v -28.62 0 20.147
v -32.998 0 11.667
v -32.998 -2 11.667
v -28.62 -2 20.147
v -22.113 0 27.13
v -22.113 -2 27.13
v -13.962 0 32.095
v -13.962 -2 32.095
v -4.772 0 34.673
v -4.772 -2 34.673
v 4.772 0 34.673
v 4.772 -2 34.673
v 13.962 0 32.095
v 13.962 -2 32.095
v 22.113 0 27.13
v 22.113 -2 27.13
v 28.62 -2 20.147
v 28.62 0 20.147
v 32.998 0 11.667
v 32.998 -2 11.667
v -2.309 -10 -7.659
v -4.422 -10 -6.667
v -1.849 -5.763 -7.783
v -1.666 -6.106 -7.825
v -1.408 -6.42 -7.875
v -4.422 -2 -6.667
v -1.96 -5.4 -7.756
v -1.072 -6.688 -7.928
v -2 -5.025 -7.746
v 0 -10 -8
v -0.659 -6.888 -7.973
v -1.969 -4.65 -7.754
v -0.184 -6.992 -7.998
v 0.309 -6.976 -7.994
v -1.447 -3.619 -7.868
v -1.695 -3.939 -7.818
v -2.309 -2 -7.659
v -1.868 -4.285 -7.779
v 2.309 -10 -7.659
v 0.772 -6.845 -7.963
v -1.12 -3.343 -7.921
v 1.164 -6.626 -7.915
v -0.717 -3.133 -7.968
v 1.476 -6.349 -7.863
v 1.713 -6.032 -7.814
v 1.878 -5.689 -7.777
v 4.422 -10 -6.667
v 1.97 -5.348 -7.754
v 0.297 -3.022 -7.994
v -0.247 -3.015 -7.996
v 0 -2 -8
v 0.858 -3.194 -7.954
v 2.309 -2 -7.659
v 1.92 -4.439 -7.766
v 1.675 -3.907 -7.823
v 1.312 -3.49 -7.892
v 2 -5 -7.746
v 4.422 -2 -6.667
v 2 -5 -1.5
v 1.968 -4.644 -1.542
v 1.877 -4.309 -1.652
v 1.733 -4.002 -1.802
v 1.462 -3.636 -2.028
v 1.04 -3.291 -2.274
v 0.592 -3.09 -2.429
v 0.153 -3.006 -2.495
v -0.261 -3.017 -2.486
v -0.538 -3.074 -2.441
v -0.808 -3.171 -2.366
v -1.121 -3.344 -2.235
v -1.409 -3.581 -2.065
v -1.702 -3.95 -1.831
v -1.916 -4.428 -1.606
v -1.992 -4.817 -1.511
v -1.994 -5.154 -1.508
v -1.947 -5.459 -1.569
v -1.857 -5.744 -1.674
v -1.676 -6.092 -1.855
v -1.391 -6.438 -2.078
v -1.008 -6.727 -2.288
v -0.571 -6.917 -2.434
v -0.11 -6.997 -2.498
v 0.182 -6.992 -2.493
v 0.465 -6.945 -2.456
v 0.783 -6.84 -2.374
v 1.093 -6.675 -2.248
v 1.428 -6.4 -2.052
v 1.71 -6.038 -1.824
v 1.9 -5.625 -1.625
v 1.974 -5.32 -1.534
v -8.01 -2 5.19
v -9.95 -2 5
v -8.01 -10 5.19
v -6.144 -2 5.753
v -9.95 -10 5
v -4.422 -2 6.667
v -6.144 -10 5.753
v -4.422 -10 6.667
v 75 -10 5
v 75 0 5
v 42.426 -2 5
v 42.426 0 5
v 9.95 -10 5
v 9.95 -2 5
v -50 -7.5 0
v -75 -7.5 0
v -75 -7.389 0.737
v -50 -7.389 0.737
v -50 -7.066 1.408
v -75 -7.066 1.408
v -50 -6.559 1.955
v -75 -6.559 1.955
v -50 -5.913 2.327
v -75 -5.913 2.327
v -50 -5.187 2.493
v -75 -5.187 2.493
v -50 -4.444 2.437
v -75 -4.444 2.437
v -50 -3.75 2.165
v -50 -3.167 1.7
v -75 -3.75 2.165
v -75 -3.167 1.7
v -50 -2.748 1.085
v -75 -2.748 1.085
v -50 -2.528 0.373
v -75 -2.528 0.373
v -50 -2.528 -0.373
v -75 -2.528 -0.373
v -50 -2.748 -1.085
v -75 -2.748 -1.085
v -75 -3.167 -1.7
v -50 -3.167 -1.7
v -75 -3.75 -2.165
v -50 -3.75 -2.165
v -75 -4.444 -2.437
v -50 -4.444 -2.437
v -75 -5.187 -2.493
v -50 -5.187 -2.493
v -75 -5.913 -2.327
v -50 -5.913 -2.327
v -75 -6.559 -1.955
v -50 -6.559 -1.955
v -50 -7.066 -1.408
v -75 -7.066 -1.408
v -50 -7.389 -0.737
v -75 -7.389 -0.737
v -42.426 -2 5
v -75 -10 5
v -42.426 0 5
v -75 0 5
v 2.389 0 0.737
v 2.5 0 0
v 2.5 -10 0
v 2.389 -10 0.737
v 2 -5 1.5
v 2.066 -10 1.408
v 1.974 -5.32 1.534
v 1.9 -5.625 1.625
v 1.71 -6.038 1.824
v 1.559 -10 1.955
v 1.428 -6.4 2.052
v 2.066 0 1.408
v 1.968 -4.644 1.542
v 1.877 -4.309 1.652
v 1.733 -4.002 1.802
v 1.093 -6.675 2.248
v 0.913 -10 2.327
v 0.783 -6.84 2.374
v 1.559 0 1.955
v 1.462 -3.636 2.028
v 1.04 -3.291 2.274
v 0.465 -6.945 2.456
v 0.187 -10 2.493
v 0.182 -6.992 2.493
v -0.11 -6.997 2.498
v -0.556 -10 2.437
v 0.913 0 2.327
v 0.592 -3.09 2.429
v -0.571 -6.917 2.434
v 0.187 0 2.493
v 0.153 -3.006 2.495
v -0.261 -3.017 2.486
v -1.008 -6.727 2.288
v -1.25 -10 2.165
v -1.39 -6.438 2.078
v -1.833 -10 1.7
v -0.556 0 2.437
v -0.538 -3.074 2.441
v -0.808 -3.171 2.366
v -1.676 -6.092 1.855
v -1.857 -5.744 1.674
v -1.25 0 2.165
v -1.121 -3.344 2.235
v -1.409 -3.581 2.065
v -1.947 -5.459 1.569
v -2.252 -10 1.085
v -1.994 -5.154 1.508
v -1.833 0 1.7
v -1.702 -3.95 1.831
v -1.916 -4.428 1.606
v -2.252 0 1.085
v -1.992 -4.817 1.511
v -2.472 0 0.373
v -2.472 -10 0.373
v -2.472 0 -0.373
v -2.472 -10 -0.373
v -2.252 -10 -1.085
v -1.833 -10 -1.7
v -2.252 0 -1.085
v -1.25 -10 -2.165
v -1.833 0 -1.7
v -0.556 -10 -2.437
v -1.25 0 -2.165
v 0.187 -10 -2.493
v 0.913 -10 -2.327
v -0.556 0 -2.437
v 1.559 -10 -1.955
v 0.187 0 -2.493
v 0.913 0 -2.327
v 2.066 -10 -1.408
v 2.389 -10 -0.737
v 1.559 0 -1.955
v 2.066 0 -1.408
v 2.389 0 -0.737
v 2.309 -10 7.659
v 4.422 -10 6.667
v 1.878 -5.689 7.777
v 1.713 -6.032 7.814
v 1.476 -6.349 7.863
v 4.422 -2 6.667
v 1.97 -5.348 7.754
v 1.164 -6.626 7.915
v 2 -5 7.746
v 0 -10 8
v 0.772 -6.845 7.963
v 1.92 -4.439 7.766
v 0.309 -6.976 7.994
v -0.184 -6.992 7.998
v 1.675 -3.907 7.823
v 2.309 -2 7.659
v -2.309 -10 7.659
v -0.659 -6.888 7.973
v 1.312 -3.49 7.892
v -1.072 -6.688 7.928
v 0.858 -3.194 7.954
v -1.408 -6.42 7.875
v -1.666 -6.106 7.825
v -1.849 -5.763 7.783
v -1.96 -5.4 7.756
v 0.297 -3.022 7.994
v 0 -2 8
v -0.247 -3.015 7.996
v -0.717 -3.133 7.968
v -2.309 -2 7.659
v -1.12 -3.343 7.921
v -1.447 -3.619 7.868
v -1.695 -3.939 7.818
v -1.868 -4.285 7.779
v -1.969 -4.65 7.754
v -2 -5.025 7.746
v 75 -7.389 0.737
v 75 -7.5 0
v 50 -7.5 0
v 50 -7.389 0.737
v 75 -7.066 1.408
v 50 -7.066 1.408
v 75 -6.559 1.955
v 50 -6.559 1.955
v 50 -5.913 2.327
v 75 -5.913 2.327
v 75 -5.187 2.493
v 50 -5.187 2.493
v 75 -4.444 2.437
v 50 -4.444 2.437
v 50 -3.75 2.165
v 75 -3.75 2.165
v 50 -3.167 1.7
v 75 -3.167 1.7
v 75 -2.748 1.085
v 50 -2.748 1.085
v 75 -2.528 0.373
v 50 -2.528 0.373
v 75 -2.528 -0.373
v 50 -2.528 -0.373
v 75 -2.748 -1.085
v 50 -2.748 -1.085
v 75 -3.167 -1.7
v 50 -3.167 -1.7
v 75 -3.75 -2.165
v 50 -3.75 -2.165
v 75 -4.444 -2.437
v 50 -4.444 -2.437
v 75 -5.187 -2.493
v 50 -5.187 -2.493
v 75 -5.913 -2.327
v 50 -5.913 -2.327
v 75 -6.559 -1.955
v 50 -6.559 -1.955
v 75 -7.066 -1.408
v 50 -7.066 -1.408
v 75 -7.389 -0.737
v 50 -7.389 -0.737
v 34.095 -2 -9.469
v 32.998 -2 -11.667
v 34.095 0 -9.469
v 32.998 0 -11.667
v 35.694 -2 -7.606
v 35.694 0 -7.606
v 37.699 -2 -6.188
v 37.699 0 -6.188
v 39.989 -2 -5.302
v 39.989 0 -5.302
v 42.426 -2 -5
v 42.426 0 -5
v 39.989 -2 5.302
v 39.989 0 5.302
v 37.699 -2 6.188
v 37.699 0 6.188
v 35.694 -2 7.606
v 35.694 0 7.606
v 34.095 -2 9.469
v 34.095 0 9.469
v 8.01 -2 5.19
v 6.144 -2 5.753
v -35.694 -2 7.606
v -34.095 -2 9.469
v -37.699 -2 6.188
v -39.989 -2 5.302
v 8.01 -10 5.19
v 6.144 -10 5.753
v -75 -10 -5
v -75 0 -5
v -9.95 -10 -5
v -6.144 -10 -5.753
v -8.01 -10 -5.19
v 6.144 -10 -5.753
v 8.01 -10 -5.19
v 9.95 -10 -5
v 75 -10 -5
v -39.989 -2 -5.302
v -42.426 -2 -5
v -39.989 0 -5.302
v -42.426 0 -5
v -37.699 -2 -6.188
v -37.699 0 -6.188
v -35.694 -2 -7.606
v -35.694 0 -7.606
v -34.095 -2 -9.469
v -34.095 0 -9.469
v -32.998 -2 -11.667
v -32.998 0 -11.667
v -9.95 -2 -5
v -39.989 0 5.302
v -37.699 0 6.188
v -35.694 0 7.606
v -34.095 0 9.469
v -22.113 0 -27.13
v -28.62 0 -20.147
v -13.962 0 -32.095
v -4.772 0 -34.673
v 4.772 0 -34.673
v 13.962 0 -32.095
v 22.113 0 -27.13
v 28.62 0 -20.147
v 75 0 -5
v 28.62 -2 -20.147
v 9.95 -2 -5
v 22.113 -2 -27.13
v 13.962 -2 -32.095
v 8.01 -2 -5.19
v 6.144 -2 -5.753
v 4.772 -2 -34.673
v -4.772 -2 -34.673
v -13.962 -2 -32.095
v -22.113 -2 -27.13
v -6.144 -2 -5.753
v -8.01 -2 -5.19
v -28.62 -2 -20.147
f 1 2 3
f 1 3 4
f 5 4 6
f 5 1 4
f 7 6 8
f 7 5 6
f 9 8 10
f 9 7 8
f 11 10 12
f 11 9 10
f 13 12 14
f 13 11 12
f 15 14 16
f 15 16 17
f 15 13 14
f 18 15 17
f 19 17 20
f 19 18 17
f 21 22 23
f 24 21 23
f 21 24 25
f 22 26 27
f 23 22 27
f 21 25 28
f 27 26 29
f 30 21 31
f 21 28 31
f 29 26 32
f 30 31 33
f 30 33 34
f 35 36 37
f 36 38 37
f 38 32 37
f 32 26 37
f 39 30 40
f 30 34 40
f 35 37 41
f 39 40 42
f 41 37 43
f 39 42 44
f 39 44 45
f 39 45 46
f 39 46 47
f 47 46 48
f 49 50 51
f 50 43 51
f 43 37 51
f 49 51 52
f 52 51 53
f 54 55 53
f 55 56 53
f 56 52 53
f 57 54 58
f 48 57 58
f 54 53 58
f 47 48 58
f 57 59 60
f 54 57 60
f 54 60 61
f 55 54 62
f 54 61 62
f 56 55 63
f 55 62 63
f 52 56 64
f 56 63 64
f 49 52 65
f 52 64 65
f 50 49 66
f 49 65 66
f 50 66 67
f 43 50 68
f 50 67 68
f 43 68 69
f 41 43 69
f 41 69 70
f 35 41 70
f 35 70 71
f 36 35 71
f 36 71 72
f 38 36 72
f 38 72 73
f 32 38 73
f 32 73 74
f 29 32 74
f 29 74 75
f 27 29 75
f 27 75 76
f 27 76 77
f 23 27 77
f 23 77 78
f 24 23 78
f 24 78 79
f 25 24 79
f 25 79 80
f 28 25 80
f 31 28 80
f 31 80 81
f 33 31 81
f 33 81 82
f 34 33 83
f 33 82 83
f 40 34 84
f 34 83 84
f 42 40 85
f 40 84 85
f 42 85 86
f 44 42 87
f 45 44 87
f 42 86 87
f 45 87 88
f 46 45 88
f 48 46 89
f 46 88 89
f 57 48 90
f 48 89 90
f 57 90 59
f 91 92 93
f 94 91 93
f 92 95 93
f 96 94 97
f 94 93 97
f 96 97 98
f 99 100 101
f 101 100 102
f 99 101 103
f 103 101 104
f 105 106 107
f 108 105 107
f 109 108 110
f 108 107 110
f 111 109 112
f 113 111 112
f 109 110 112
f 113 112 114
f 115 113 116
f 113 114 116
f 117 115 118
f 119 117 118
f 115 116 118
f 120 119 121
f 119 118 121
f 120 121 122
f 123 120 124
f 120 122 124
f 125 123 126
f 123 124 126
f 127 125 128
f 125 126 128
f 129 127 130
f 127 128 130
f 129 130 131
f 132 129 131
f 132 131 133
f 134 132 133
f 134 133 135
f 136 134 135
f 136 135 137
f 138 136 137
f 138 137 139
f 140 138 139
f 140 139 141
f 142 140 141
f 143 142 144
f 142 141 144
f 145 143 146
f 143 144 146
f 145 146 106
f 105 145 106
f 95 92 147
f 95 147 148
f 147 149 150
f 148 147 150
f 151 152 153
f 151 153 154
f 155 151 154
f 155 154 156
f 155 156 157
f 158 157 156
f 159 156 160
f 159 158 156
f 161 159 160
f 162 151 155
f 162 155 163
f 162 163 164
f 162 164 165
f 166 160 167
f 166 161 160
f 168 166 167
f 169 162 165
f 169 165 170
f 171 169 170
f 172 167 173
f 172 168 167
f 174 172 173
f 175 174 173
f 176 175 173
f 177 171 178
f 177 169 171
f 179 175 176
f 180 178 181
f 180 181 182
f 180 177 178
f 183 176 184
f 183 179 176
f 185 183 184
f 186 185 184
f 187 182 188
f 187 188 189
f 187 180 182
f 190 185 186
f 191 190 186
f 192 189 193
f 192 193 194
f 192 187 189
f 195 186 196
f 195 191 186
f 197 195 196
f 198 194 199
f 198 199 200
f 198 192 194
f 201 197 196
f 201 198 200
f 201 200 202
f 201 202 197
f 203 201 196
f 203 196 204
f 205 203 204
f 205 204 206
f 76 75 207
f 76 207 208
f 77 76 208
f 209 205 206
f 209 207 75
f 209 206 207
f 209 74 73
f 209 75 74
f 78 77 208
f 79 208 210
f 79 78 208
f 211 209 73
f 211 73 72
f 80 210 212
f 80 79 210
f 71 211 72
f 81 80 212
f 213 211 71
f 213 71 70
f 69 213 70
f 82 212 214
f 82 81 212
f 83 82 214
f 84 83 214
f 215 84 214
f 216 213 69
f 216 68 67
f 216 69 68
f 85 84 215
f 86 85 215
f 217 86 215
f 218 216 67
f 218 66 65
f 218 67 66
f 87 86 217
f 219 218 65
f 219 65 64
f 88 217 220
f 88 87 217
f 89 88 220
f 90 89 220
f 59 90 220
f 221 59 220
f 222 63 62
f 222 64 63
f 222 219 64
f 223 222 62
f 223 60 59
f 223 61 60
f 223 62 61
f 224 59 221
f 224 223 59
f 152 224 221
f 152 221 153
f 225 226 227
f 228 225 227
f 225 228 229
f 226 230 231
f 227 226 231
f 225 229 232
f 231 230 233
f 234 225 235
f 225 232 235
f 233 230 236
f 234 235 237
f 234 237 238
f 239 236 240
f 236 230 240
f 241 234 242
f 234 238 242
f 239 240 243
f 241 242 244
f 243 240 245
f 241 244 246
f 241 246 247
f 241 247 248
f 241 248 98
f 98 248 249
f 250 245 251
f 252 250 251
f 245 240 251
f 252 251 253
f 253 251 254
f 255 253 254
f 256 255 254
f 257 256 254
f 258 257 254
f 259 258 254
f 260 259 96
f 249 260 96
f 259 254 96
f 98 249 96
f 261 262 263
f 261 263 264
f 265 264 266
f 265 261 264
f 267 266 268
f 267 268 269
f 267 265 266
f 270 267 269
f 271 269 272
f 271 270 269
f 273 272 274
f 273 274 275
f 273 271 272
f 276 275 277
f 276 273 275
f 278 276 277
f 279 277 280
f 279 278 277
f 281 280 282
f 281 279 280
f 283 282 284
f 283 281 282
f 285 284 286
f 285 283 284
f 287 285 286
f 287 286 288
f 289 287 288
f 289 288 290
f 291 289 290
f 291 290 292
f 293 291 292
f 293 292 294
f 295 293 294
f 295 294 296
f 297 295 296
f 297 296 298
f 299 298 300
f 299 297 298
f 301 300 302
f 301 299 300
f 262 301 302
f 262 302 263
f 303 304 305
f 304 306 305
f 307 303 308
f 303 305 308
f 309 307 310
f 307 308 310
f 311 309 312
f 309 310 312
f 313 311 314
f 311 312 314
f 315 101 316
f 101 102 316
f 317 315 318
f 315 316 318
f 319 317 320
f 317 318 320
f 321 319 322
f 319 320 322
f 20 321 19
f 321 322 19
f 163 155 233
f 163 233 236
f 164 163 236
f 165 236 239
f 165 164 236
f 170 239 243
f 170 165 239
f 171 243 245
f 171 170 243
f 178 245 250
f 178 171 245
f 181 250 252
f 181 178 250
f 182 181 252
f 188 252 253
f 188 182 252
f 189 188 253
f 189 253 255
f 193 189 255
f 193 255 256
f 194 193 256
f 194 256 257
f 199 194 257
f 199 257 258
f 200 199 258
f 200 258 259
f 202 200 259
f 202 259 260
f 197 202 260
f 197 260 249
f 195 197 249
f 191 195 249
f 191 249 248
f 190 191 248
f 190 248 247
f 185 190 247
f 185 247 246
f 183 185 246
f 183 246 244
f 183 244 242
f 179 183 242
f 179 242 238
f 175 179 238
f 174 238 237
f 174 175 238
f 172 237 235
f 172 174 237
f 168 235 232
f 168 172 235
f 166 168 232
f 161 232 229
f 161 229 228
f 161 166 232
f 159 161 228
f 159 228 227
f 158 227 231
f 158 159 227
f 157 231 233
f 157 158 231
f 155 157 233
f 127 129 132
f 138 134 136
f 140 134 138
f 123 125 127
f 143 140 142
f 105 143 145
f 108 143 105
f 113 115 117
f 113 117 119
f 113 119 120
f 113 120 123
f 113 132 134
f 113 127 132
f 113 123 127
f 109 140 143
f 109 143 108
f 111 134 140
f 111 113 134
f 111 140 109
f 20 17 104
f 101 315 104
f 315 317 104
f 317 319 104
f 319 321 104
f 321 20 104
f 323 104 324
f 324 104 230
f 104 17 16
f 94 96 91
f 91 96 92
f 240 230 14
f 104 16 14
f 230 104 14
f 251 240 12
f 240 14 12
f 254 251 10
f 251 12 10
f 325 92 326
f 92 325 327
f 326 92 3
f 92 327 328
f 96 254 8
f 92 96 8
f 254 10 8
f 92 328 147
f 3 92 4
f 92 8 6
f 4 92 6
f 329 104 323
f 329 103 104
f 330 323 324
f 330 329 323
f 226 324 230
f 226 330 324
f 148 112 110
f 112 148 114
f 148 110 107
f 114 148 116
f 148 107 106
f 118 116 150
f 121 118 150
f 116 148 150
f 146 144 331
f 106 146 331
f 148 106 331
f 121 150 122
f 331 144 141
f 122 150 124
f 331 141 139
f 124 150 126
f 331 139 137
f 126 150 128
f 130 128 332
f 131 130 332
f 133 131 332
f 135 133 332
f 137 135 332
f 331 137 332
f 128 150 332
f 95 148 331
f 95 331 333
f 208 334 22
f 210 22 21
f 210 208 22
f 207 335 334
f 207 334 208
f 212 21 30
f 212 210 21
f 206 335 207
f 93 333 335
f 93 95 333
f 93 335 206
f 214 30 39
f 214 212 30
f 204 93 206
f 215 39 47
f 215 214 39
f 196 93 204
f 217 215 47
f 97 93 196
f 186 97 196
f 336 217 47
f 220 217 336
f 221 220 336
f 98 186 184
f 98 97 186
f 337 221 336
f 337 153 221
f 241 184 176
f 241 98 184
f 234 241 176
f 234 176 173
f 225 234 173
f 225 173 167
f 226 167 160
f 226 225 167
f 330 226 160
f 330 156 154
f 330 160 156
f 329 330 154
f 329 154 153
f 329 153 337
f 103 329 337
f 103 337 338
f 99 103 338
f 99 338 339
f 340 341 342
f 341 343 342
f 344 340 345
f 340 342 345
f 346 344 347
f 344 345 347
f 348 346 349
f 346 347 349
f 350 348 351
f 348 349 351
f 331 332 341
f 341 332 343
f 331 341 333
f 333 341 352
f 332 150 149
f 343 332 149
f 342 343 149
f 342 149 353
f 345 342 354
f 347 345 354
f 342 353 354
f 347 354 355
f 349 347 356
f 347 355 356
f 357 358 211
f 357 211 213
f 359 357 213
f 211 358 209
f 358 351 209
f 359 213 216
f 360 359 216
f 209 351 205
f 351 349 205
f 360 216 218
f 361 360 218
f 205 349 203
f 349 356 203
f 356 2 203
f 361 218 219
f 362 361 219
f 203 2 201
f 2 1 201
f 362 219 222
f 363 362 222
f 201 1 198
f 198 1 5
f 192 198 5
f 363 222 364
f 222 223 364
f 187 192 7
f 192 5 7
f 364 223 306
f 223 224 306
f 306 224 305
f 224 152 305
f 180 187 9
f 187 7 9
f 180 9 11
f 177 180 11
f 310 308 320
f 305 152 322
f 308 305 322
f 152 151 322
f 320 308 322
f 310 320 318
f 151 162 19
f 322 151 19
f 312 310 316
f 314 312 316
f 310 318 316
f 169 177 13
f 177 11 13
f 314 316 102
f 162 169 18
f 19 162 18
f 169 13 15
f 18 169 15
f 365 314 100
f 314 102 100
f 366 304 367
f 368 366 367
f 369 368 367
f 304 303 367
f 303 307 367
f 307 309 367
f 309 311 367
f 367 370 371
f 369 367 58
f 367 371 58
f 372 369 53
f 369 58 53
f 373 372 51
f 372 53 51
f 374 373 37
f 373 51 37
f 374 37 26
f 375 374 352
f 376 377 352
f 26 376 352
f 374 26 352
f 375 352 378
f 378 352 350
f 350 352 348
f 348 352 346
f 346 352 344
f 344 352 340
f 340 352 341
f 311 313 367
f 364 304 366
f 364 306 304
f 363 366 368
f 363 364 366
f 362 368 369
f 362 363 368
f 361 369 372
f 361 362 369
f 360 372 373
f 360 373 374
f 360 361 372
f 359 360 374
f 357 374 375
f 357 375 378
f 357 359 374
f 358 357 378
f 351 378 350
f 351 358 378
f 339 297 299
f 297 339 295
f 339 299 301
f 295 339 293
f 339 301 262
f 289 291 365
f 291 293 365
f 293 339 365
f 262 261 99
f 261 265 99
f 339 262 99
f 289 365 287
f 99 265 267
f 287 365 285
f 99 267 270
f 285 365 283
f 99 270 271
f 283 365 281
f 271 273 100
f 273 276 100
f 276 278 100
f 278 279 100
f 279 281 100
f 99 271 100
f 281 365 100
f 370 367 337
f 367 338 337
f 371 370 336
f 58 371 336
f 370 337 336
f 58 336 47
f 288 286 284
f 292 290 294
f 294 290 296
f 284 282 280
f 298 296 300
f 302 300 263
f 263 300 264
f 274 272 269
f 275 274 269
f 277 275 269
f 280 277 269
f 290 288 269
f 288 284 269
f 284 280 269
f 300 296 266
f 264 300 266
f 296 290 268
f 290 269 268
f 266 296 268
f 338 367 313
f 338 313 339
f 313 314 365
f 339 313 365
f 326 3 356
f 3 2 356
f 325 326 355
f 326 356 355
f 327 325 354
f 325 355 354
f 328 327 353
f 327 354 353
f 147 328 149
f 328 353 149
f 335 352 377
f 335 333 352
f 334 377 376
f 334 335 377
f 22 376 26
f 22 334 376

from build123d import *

# Parameters (mm, degrees)
F0_R          = 2.5
F1_DEPTH      = 10
F2_R          = 35
F2_R_2        = 2.5
F3_DEPTH      = 2
F4_R          = 2.5
F5_DEPTH      = 25
F6_R          = 2
F7_DEPTH      = 35.001
F7_DEPTH_BACK = 35.001
F8_R          = 10


# Not quite as in the source:
# - a pattern or mirror of a feature is missing from the dataset's text; its kind, count and spacing are read off the source's solid


with BuildPart() as f1:
    # F0 (on Front) → F1 (new body)
    with BuildSketch(Plane.XZ):
        with BuildLine():
            Line((75, 5), (6.2449979984, 5))
            ThreePointArc((6.2449979984, 5), (0, 8), (-6.2449979984, 5))
            Line((-6.2449979984, 5), (-75, 5))
            Line((-75, 5), (-75, -5))
            Line((-75, -5), (-6.2449979984, -5))
            ThreePointArc((-6.2449979984, -5), (0, -8), (6.2449979984, -5))
            Line((6.2449979984, -5), (75, -5))
            Line((75, -5), (75, 5))
        make_face()
        Circle(F0_R, mode=Mode.SUBTRACT)
    extrude(amount=F1_DEPTH)

    # F2 (on face) → F3 (join)
    with BuildSketch(Plane(origin=(0, 0, 0), x_dir=(-1, 0, 0), z_dir=(0, 1, 0))):
        Circle(F2_R)
        Circle(F2_R_2, mode=Mode.SUBTRACT)
    extrude(amount=-F3_DEPTH)

    # F4 (on face) → F5 (cut)
    with BuildSketch(Plane(origin=(-75, 0, 0), x_dir=(0, -1, 0), z_dir=(-1, 0, 0))):
        with Locations((5, 0)):
            Circle(F4_R)
    f5 = extrude(amount=-F5_DEPTH, mode=Mode.SUBTRACT)

    # F5_copies: F5 across plane
    add(f5.mirror(Plane(origin=(0, 0, 0), x_dir=(0, 0, 1), z_dir=(1, 0, 0))), mode=Mode.SUBTRACT)

    # F6 (on Top) → F7 (cut, two sides)
    with BuildSketch(Plane.XY) as f7_sk:
        with Locations((0, -5)):
            Circle(F6_R)
    extrude(amount=-F7_DEPTH, mode=Mode.SUBTRACT)
    extrude(f7_sk.sketch, amount=F7_DEPTH_BACK, mode=Mode.SUBTRACT)

    # F8
    f8_edges = [f1.edges().sort_by_distance(p)[0] for p in [
        (-6.244998, -6, 5),
        (6.244998, -6, 5),
        (6.244998, -6, -5),
        (-6.244998, -6, -5),
        (34.641016, -1, 5),
        (34.641016, -1, -5),
        (-34.641016, -1, -5),
        (-34.641016, -1, 5),
    ]]
    fillet(f8_edges, radius=F8_R)


solid = f1.part
